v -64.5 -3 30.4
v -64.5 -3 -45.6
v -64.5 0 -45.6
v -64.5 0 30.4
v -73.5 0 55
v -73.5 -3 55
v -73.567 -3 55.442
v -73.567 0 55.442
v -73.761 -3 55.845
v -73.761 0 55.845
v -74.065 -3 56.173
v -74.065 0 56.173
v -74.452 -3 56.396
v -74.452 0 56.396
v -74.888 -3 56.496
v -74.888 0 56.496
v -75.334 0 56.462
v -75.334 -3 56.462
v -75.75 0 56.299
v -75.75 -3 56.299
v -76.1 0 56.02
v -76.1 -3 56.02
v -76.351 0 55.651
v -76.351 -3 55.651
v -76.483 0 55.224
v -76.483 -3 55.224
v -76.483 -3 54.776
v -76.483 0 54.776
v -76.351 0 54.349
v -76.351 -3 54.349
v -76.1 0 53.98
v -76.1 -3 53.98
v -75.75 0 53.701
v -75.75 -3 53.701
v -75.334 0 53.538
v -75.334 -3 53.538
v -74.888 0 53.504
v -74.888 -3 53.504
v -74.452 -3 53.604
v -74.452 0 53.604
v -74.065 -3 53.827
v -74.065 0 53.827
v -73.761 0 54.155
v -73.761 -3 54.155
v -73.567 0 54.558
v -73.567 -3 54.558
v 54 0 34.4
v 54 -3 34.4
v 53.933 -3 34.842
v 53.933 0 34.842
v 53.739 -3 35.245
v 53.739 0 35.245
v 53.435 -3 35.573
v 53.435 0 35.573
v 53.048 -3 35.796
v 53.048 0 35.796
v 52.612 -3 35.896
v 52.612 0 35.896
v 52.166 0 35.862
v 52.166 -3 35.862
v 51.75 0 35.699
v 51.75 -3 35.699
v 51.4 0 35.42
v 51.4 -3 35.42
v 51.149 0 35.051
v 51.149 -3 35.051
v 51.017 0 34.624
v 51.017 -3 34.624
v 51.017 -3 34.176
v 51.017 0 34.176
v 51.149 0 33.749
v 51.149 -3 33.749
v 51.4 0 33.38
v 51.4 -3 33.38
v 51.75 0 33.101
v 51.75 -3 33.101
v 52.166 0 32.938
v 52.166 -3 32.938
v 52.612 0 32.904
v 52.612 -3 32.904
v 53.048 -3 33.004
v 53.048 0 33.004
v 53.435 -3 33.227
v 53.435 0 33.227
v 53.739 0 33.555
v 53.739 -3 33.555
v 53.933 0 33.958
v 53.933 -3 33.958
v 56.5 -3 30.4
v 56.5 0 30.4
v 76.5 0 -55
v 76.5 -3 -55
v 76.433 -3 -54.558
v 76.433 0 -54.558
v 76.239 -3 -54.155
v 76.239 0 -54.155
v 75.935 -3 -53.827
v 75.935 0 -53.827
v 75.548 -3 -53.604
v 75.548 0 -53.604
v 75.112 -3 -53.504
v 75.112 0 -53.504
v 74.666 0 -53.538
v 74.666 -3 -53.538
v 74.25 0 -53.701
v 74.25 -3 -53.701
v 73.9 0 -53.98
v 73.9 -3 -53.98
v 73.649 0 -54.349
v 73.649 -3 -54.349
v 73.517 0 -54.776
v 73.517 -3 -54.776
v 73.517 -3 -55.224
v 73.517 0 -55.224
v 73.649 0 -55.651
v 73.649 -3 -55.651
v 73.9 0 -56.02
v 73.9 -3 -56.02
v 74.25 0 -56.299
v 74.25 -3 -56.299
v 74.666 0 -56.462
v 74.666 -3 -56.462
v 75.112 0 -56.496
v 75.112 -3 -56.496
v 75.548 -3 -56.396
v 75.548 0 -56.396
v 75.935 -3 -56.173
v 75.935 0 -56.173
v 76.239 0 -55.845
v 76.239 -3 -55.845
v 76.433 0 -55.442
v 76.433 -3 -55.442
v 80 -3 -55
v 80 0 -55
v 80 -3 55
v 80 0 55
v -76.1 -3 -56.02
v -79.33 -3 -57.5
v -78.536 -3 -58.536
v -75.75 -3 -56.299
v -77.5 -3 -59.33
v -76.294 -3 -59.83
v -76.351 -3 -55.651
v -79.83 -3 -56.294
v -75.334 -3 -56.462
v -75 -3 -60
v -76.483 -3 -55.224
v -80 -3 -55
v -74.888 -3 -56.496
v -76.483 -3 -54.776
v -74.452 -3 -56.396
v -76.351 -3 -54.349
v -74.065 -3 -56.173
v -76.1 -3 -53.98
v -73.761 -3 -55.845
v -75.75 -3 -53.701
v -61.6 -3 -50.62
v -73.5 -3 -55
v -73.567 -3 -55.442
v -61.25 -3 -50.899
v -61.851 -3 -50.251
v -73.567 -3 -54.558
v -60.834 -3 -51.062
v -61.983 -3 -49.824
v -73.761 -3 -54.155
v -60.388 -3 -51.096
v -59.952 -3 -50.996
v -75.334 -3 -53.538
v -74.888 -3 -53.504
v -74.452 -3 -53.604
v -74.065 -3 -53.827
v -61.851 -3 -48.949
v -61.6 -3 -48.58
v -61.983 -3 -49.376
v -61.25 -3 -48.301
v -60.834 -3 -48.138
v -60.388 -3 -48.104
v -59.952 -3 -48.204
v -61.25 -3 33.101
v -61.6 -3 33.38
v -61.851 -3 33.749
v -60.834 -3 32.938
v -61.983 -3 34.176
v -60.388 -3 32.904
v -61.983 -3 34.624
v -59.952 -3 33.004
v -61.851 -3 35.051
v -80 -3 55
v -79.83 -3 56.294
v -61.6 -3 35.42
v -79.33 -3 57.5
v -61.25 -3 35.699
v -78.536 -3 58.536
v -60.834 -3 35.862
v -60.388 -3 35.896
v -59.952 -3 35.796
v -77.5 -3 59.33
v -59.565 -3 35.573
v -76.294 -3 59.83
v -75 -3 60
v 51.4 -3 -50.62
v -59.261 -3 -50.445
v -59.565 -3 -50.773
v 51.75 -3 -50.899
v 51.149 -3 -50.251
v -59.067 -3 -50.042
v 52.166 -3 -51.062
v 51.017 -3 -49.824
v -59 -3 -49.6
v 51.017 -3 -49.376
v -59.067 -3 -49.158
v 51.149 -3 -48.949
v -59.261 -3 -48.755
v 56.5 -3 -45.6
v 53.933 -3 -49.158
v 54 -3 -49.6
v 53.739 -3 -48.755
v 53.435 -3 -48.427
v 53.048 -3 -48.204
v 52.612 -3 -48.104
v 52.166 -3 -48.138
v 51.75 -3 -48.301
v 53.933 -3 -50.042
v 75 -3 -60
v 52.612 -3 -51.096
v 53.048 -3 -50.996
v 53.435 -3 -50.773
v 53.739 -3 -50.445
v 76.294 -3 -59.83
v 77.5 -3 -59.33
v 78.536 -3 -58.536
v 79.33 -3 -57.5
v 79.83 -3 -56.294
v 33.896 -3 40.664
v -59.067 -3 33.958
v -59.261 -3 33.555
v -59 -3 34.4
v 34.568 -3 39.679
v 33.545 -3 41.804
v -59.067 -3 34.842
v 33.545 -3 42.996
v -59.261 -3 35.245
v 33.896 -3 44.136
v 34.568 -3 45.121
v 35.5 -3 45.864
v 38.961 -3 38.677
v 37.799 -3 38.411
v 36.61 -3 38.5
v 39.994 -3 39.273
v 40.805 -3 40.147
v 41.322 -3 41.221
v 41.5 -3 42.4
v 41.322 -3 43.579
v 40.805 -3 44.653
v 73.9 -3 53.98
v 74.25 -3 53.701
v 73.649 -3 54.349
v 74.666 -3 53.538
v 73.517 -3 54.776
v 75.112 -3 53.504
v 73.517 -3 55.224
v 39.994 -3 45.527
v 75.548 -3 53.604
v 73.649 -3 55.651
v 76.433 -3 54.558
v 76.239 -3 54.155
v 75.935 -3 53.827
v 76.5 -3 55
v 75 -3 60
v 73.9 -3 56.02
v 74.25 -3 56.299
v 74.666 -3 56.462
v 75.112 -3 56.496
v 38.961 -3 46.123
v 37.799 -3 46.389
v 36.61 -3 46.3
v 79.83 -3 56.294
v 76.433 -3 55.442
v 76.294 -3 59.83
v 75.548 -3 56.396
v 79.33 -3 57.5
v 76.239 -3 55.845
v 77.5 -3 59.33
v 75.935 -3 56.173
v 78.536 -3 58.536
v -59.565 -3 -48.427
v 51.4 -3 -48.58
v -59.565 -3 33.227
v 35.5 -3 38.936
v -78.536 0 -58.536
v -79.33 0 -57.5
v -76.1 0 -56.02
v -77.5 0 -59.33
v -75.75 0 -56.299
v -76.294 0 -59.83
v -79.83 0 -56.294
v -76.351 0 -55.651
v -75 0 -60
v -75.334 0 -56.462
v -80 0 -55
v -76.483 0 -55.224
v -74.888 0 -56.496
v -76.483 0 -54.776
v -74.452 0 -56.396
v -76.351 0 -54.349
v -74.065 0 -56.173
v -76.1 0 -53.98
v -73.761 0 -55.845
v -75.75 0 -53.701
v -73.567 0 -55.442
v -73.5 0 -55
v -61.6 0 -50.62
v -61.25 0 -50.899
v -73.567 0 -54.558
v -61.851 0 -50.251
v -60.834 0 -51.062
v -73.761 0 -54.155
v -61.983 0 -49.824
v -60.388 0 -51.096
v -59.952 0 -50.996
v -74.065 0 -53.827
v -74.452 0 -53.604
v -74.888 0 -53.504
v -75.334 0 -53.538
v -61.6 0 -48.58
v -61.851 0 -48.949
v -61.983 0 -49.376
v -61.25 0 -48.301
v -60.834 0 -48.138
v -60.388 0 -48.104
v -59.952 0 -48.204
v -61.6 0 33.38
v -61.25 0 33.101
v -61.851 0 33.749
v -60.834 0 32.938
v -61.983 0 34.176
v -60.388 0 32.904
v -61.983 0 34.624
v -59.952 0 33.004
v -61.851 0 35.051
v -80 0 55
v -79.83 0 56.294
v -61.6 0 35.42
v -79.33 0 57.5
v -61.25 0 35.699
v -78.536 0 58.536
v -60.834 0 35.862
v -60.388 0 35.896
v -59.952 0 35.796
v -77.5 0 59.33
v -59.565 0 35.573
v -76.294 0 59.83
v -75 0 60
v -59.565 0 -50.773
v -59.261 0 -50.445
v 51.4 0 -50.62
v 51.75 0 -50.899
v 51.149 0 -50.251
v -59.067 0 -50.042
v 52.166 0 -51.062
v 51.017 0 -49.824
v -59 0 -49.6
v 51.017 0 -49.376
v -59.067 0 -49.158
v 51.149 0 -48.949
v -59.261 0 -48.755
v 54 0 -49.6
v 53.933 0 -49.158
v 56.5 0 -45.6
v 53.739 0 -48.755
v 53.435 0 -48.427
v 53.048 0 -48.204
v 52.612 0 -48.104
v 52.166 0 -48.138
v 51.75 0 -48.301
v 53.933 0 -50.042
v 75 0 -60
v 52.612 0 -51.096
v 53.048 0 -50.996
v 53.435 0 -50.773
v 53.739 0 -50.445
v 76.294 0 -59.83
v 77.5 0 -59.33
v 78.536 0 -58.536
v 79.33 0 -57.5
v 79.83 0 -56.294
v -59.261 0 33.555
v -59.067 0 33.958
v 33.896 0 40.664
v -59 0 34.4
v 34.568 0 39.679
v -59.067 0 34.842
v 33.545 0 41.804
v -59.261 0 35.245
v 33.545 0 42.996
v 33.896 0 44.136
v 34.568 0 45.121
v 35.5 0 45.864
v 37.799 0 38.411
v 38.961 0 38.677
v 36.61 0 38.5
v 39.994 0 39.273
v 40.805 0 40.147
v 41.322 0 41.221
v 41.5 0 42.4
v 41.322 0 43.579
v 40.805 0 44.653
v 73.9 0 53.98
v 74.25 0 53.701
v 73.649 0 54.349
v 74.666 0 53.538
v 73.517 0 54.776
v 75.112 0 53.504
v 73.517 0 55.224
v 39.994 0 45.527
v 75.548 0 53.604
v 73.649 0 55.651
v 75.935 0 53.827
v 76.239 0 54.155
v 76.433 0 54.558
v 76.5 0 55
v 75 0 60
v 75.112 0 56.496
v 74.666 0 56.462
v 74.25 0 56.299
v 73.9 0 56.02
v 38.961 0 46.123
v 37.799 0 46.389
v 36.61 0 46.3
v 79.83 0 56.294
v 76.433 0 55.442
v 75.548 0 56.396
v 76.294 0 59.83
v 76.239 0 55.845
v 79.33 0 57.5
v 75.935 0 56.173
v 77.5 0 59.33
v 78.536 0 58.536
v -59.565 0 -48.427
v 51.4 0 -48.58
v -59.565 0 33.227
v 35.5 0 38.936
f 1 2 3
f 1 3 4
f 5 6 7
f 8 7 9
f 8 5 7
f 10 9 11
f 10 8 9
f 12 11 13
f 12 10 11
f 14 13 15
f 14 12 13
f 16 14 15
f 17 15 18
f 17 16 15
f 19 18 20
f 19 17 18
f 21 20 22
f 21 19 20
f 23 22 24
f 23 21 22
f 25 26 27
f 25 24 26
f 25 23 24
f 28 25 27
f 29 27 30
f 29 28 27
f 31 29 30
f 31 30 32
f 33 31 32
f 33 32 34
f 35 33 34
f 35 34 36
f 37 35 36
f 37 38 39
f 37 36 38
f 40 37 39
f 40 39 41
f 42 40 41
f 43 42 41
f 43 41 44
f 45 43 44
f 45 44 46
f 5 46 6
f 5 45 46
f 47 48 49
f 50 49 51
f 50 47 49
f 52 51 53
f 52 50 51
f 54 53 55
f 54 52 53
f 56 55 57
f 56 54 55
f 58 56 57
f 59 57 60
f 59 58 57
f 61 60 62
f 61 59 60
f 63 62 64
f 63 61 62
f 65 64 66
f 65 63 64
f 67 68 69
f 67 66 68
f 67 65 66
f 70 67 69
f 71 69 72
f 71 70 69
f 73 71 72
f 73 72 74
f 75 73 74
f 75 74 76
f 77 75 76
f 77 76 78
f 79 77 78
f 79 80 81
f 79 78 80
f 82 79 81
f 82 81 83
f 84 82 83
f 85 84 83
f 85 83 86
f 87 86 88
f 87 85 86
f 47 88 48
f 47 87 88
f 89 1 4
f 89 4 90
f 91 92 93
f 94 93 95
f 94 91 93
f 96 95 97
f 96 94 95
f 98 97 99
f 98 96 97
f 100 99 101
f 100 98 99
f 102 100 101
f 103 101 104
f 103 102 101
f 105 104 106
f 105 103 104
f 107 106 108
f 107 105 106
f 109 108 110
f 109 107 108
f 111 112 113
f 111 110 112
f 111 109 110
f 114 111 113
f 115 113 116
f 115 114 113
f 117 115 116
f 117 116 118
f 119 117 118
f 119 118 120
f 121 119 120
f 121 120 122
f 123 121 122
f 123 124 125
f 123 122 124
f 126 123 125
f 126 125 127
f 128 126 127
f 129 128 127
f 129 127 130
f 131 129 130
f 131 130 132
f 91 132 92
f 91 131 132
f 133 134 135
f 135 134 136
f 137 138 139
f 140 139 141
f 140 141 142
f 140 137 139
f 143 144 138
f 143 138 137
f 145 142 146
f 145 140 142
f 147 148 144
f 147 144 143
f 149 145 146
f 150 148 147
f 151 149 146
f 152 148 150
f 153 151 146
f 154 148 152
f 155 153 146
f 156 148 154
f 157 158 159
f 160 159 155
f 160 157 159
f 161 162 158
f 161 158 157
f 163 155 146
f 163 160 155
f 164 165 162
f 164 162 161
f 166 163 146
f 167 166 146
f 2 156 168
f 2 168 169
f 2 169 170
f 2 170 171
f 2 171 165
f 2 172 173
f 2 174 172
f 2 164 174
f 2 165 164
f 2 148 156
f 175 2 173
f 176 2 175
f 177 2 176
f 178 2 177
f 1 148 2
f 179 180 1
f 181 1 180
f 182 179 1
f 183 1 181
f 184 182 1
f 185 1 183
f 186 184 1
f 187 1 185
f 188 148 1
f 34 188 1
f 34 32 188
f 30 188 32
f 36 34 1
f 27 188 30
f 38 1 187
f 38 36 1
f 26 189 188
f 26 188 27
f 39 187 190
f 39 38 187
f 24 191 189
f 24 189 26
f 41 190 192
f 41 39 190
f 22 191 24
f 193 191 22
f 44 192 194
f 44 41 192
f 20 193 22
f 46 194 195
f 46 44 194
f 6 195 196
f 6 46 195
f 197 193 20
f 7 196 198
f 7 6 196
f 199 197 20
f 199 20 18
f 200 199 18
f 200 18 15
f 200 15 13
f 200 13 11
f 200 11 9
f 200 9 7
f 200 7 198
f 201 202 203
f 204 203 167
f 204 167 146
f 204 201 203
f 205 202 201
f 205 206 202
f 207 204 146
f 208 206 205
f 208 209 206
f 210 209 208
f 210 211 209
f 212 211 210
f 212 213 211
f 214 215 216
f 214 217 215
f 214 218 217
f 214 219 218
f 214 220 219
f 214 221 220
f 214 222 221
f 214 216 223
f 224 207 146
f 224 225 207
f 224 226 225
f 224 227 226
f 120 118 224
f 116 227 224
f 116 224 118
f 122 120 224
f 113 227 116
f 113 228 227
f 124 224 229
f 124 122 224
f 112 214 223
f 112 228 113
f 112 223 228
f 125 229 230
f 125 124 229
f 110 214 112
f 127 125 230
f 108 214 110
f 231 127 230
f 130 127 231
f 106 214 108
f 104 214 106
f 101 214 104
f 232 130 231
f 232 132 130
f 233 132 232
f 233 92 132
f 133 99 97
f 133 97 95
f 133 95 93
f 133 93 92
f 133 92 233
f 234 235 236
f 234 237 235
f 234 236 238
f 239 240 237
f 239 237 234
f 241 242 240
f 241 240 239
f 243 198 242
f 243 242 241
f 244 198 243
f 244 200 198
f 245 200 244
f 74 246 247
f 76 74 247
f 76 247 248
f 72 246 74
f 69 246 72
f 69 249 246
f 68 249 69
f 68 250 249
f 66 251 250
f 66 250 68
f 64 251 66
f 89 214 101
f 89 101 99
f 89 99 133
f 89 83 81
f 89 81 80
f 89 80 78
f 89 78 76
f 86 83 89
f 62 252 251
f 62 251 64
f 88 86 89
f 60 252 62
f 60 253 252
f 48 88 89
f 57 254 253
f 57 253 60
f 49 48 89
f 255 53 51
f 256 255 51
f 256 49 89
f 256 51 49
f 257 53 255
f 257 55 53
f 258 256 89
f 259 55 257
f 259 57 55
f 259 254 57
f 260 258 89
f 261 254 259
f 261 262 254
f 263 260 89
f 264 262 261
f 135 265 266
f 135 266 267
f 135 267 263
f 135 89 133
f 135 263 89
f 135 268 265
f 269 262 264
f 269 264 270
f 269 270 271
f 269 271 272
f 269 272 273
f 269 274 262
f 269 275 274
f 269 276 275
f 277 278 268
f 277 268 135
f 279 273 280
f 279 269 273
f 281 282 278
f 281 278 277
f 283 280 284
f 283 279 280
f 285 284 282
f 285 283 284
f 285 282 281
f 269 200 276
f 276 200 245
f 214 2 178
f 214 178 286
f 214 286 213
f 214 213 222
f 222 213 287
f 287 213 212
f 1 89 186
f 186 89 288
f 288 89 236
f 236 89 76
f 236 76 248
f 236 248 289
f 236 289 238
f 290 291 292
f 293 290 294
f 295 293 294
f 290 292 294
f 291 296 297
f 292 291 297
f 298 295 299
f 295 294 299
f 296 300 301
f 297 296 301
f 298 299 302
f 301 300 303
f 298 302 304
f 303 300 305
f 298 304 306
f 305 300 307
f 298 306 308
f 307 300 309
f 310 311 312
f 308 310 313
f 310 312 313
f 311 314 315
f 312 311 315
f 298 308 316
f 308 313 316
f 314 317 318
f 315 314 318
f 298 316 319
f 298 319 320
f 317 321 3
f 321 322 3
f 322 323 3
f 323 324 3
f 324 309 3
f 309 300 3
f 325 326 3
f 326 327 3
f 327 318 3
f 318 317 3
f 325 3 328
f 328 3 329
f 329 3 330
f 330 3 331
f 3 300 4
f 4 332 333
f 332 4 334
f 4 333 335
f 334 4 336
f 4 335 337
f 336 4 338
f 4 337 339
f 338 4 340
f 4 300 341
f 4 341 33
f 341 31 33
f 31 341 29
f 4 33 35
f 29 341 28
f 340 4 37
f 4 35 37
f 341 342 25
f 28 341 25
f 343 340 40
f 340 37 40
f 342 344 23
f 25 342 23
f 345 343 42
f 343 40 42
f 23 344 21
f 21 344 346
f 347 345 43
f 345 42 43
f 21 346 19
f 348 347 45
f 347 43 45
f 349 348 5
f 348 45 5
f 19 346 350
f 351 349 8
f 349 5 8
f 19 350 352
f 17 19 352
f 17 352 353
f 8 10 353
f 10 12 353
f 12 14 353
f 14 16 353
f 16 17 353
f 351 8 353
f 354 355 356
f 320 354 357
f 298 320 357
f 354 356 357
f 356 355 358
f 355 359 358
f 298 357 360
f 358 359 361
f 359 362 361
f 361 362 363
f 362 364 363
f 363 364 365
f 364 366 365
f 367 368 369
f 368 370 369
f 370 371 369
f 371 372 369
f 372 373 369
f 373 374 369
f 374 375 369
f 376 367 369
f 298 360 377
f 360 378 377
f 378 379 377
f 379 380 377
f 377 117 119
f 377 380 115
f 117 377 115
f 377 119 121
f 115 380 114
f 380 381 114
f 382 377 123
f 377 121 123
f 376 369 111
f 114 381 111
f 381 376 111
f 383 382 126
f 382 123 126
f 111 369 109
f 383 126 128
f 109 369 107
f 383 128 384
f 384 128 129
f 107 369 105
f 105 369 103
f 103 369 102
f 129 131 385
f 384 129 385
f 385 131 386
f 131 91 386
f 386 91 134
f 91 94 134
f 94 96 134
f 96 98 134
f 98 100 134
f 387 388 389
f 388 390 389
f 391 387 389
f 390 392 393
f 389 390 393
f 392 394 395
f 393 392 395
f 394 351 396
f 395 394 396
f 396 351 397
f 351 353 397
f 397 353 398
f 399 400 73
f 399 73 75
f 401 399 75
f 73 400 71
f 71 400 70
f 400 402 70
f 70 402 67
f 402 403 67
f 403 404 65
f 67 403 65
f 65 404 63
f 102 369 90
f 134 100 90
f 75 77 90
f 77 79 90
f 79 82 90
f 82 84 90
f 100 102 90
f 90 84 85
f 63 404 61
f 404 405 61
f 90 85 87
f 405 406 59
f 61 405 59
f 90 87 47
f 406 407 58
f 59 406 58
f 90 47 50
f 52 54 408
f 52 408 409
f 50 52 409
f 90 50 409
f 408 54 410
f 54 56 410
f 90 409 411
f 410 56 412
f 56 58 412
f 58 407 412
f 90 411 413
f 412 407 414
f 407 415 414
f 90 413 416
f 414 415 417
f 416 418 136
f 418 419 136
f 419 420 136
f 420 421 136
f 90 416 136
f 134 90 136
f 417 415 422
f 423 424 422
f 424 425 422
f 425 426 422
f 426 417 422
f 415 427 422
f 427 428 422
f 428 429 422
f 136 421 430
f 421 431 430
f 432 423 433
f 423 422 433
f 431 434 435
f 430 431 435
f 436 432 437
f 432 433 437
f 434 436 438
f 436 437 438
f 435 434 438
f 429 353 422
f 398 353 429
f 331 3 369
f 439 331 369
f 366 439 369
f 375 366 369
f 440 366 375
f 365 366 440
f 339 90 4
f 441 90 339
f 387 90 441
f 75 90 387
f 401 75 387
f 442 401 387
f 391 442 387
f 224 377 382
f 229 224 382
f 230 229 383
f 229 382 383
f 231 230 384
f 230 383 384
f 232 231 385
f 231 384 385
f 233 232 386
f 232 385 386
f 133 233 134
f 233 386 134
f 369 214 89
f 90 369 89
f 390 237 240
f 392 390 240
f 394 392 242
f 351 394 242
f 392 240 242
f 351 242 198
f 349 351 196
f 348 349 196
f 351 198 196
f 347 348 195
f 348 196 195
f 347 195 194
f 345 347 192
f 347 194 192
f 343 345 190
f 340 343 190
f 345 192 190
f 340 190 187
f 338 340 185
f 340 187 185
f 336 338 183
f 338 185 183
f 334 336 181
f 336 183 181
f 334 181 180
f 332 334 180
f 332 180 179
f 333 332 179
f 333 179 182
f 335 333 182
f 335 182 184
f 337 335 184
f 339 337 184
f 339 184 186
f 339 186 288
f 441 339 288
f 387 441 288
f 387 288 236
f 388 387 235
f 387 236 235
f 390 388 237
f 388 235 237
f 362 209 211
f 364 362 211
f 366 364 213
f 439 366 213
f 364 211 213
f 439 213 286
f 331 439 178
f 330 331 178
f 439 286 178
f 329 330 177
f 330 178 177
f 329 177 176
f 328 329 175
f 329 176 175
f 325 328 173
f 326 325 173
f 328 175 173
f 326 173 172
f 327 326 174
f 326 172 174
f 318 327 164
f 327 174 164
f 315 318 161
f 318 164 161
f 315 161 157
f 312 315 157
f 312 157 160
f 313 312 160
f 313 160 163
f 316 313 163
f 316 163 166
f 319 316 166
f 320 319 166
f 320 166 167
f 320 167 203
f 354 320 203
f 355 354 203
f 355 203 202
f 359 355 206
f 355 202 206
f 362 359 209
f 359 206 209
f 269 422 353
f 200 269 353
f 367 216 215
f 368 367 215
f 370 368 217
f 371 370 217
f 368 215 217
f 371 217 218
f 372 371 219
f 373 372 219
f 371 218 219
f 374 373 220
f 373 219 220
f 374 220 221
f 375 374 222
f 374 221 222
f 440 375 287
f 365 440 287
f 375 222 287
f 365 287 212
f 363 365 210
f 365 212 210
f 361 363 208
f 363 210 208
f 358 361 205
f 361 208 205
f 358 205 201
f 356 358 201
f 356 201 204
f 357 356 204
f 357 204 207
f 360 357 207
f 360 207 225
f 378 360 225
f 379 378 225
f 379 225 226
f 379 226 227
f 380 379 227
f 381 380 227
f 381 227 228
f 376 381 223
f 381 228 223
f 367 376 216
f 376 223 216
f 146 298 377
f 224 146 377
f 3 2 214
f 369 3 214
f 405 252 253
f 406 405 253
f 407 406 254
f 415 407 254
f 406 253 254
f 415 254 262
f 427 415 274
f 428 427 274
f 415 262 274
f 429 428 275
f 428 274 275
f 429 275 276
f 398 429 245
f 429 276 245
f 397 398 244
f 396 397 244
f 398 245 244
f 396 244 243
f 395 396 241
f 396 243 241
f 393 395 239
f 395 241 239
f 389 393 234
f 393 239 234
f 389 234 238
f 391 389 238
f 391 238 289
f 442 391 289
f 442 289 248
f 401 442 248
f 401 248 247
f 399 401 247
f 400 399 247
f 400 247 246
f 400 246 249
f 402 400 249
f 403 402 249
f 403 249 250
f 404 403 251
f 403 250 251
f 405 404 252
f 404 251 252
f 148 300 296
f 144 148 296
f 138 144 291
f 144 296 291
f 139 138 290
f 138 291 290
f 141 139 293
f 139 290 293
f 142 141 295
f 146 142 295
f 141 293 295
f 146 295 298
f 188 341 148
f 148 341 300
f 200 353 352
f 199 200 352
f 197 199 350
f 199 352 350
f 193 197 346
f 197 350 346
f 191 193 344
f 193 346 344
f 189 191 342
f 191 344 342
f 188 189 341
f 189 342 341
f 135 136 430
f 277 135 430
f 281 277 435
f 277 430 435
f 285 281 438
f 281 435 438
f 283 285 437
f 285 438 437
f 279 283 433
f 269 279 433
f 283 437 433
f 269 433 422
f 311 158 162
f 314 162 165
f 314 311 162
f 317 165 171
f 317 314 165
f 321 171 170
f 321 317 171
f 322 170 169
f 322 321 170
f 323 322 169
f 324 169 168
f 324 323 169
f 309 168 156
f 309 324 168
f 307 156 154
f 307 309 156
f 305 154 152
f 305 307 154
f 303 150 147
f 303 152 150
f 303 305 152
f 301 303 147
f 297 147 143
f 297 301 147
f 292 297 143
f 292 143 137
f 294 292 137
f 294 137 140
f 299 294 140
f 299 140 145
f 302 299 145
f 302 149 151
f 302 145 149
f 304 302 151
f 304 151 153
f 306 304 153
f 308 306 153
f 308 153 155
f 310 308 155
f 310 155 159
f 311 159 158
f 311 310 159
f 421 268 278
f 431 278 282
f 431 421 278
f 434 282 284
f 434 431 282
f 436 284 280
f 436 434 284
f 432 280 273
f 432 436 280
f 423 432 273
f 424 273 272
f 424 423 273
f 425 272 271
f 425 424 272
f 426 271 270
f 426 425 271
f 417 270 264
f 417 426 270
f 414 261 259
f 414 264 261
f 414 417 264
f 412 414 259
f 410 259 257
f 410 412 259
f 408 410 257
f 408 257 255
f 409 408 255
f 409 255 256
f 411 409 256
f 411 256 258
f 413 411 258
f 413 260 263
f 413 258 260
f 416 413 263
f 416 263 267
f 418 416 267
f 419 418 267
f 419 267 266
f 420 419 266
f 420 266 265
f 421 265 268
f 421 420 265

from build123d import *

# Parameters (mm, degrees)
F1_DEPTH = 3
F2_R     = 1.5
F3_DEPTH = 25
F4_R     = 1.5
F5_DEPTH = 25
F6_W     = 121
F6_H     = 76
F6_R     = 1.5
F7_DEPTH = 3
F8_R     = 4
F9_DEPTH = 3


# Not quite as in the source:
# - a feature names something its author has since deleted; it is built from what else it names


with BuildPart() as f1:
    # F0 (on Front) → F1 (new body)
    with BuildSketch(Plane.XZ):
        with BuildLine():
            Line((-75, -60), (75, -60))
            ThreePointArc((75, -60), (78.5355339059, -58.5355339059), (80, -55))
            Line((80, -55), (80, 55))
            ThreePointArc((80, 55), (78.5355339059, 58.5355339059), (75, 60))
            Line((75, 60), (-75, 60))
            ThreePointArc((-75, 60), (-78.5355339059, 58.5355339059), (-80, 55))
            Line((-80, 55), (-80, -55))
            ThreePointArc((-80, -55), (-78.5355339059, -58.5355339059), (-75, -60))
        make_face()
    extrude(amount=F1_DEPTH)

    # F2 (on Front) → F3 (cut)
    with BuildSketch(Plane.XZ):
        with Locations((-75, 55)):
            Circle(F2_R)
        with Locations((75, 55)):
            Circle(F2_R)
        with Locations((75, -55)):
            Circle(F2_R)
        with Locations((-75, -55)):
            Circle(F2_R)
    extrude(amount=F3_DEPTH, mode=Mode.SUBTRACT)

    # F4 (on Front) → F5 (cut)
    with BuildSketch(Plane.XZ):
        with Locations((52.5, 34.4)):
            Circle(F4_R)
    extrude(amount=F5_DEPTH, mode=Mode.SUBTRACT)

    # F6 (on face) → F7 (cut)
    with BuildSketch(Plane.XZ.offset(3)):
        with Locations((-4, -7.6)):
            Rectangle(F6_W, F6_H)
        with Locations((52.5, 34.4)):
            Circle(F6_R)
        with Locations((-60.5, 34.4)):
            Circle(F6_R)
        with Locations((-60.5, -49.6)):
            Circle(F6_R)
        with Locations((52.5, -49.6)):
            Circle(F6_R)
    extrude(amount=-F7_DEPTH, mode=Mode.SUBTRACT)

    # F8 (on face) → F9 (cut)
    with BuildSketch(Plane.XZ.offset(3)):
        with Locations((37.5, 42.4)):
            Circle(F8_R)
    extrude(amount=-F9_DEPTH, mode=Mode.SUBTRACT)


solid = f1.part
